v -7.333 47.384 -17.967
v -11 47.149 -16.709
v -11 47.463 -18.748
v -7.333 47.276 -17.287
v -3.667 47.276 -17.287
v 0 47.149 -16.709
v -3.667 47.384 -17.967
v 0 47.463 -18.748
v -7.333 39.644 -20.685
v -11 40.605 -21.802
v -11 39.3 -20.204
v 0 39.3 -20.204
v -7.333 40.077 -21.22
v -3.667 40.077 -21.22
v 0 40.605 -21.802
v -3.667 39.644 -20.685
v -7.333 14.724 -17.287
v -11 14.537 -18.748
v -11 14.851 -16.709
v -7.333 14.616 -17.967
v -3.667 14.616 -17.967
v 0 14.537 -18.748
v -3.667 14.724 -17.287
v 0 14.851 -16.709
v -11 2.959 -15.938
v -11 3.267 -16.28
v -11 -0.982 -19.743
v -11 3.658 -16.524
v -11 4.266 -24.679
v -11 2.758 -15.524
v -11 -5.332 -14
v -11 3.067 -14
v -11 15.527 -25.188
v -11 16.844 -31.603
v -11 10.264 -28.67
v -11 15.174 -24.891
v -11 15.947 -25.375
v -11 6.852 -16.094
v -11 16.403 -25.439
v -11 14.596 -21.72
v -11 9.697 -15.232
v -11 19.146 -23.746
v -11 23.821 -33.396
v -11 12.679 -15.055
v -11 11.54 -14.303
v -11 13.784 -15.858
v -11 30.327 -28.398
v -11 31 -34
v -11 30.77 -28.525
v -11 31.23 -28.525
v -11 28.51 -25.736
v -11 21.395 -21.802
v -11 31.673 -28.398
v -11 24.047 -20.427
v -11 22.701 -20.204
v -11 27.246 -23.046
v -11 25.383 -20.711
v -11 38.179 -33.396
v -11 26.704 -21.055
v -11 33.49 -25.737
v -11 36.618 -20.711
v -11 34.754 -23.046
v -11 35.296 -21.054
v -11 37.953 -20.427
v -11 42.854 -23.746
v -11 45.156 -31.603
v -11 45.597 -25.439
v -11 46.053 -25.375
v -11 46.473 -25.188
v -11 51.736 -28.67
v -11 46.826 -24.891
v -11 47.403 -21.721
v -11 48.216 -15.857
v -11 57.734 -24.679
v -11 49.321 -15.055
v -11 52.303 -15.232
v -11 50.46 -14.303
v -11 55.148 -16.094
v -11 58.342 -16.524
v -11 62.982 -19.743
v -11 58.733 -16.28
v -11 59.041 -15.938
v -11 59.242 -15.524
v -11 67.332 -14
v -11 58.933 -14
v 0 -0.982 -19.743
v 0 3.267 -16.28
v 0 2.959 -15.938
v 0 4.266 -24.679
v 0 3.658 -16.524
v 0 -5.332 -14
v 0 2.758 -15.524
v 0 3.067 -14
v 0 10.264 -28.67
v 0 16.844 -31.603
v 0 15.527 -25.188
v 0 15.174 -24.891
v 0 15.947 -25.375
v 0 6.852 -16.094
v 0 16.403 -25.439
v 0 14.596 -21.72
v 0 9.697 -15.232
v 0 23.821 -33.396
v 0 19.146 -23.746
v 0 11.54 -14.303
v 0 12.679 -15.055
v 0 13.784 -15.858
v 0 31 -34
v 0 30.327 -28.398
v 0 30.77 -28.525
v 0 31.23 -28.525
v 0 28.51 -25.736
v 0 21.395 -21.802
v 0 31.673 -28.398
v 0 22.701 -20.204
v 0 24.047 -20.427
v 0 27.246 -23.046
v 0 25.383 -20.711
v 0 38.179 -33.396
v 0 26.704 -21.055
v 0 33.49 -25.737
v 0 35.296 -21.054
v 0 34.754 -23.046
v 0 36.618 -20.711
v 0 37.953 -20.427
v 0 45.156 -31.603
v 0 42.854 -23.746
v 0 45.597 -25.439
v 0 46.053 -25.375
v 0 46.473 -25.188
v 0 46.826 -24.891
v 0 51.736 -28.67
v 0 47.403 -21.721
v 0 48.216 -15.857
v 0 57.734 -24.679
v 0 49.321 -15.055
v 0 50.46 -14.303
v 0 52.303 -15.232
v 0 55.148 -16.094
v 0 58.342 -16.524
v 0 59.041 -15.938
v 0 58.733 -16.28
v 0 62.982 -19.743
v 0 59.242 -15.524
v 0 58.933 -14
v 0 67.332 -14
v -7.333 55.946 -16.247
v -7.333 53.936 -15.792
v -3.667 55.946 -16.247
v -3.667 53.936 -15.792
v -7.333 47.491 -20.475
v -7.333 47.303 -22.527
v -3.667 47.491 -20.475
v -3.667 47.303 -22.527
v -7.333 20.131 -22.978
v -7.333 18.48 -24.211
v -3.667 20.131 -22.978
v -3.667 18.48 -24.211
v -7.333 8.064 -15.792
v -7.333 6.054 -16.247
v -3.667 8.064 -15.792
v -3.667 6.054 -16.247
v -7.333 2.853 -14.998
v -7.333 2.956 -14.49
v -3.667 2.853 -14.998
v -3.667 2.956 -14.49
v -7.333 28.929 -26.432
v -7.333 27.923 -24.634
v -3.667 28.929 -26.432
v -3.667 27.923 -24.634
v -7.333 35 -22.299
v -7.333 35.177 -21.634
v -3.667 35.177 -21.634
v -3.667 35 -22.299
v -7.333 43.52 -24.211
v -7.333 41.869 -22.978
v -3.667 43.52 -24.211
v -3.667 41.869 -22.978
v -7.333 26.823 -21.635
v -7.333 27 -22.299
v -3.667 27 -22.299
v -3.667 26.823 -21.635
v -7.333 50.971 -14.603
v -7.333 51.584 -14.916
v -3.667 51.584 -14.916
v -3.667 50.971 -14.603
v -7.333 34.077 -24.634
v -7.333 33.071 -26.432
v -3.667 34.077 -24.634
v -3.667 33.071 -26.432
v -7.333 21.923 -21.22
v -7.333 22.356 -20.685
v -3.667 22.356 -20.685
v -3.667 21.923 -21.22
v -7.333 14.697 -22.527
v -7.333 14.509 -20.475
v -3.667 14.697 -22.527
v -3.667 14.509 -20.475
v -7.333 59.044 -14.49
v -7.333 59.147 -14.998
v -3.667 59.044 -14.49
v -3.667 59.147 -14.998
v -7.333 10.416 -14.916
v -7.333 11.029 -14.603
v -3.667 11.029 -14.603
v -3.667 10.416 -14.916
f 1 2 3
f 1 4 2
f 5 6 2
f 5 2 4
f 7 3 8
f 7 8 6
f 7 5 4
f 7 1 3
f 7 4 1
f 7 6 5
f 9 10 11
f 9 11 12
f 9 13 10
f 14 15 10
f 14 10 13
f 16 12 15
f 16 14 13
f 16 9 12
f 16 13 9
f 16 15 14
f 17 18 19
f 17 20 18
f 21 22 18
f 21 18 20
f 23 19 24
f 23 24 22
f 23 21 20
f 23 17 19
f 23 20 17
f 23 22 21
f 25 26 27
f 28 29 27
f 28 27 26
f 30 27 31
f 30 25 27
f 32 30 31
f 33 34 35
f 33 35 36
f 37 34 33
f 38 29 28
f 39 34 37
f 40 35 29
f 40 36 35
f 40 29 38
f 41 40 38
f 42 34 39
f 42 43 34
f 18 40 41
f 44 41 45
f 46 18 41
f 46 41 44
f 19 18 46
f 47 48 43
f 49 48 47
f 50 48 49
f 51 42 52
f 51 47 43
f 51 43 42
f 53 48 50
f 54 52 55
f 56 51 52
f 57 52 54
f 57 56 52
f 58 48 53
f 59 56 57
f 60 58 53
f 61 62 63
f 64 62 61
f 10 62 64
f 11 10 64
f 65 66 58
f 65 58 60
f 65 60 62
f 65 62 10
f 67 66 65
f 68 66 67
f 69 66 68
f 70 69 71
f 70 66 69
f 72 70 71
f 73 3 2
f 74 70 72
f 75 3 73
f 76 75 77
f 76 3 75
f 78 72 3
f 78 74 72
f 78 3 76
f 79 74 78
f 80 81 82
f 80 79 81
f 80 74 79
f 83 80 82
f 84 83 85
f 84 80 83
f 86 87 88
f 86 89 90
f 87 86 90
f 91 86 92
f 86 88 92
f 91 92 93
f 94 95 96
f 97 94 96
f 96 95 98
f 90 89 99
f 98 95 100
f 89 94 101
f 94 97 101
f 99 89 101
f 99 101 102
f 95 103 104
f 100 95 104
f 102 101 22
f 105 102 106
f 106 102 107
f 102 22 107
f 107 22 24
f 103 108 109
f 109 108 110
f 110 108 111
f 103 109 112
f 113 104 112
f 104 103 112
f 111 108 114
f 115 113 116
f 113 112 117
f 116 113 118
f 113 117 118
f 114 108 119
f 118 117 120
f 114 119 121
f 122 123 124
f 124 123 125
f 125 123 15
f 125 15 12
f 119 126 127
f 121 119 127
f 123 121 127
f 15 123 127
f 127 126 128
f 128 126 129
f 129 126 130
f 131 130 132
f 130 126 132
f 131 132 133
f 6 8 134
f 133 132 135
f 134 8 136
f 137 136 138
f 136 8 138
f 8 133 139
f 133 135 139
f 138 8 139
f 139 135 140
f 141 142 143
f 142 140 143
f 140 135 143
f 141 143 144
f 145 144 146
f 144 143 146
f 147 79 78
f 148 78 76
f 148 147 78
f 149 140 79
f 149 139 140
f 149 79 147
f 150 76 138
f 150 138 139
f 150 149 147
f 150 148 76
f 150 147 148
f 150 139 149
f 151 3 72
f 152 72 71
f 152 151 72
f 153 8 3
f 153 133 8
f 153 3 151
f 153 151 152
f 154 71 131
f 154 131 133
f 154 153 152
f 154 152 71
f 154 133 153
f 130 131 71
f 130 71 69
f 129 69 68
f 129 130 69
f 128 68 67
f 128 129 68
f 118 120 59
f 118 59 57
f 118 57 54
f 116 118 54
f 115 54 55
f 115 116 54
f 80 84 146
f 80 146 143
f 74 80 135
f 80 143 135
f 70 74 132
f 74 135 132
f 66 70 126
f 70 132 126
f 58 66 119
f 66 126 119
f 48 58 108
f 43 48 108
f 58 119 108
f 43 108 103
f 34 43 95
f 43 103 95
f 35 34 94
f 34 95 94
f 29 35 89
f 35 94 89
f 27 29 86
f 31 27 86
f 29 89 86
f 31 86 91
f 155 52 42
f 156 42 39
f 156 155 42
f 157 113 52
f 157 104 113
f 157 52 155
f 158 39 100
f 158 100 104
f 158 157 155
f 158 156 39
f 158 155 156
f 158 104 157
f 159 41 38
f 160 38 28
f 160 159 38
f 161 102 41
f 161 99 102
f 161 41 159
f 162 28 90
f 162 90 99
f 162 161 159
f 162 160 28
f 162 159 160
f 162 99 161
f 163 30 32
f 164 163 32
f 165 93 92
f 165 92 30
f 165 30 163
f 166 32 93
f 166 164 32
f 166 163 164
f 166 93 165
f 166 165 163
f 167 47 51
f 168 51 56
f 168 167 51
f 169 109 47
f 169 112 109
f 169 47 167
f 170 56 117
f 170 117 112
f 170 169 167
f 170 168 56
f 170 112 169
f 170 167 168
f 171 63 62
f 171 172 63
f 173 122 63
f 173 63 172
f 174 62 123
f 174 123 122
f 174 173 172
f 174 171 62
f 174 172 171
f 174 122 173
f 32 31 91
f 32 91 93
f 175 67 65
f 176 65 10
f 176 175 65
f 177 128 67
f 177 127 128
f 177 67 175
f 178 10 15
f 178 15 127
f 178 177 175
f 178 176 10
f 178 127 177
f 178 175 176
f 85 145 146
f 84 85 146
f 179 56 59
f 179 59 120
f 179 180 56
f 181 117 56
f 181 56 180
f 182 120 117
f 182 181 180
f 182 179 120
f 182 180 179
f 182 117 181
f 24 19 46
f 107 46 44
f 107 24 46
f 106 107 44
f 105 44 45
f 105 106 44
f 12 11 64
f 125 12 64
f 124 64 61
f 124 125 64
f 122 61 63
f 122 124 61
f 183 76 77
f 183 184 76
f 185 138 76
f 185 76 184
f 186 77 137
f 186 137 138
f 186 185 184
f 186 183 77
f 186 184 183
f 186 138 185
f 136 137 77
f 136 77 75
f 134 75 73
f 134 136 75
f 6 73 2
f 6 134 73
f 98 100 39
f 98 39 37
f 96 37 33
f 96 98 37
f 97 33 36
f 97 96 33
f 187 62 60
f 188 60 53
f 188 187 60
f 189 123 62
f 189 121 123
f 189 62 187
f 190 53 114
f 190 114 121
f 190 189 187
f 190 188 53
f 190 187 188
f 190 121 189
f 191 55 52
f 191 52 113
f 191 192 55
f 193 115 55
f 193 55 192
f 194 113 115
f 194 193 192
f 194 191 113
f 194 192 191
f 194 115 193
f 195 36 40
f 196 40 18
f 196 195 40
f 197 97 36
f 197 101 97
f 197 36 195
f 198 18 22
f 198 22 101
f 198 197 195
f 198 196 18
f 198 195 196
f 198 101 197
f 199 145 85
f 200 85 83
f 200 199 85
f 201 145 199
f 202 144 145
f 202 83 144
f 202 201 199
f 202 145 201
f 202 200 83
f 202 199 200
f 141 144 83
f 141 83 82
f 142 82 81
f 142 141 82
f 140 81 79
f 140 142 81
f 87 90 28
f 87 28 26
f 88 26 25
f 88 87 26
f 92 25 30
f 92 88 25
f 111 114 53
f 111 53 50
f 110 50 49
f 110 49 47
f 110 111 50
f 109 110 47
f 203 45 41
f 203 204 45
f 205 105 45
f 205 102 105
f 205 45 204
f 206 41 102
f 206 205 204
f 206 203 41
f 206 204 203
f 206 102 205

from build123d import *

# Parameters (mm, degrees)
CYLINDER002_R           = 43
CYLINDER002_DEPTH       = 11
BOX003_W                = 66
BOX003_H                = 86
BOX003_DEPTH            = 11
POCKET_DEPTH            = 11
BODY002_PLACEMENT_ANGLE = 90


with BuildPart() as part:
    # Cylinder002 → Cylinder002 (join)
    with BuildSketch(Plane.XY):
        Circle(CYLINDER002_R)
    extrude(amount=CYLINDER002_DEPTH)

    # Box003 → Box003 (cut)
    with BuildSketch(Plane(origin=(-23, -43, 0), x_dir=(1, 0, 0), z_dir=(0, 0, 1))):
        with Locations((33, 43)):
            Rectangle(BOX003_W, BOX003_H)
    extrude(amount=BOX003_DEPTH, mode=Mode.SUBTRACT)

    # InvoluteGear001 → Pocket (cut)
    with BuildSketch(Plane.XY):
        with BuildLine():
            add(Edge.make_bspline(
                [(36.720789, -7.117559), (35.064159, -5.114865), (33.453467, -3.817874), (32.125762, -2.991102)],
                knots=[0, 0, 0, 0, 1, 1, 1, 1], degree=3))
            add(Edge.make_bspline(
                [(32.125762, -2.991102), (31.416273, -2.550129), (30.796057, -2.249632), (30.29133, -2.046354)],
                knots=[0, 0, 0, 0, 1, 1, 1, 1], degree=3))
            ThreePointArc((30.29133, -2.046354), (30.222112, -0.000102), (30.290969, 2.046161))
            add(Edge.make_bspline(
                [(30.290969, 2.046161), (30.796057, 2.249632), (31.416273, 2.550129), (32.125762, 2.991102)],
                knots=[0, 0, 0, 0, 1, 1, 1, 1], degree=3))
            add(Edge.make_bspline(
                [(32.125762, 2.991102), (33.453467, 3.817874), (35.064159, 5.114865), (36.720789, 7.117559)],
                knots=[0, 0, 0, 0, 1, 1, 1, 1], degree=3))
            ThreePointArc((36.720789, 7.117559), (36.721141, 7.80532), (36.441082, 8.433477))
            add(Edge.make_bspline(
                [(36.441082, 8.433477), (34.113106, 9.589217), (32.114132, 10.11895), (30.564934, 10.334217)],
                knots=[0, 0, 0, 0, 1, 1, 1, 1], degree=3))
            add(Edge.make_bspline(
                [(30.564934, 10.334217), (29.737424, 10.44849), (29.048606, 10.470744), (28.504834, 10.451156)],
                knots=[0, 0, 0, 0, 1, 1, 1, 1], degree=3))
            ThreePointArc((28.504834, 10.451156), (27.609315, 12.292347), (26.839929, 14.189708))
            add(Edge.make_bspline(
                [(26.839929, 14.189708), (27.21859, 14.581026), (27.662962, 15.107808), (28.131753, 15.799232)],
                knots=[0, 0, 0, 0, 1, 1, 1, 1], degree=3))
            add(Edge.make_bspline(
                [(28.131753, 15.799232), (29.008394, 17.094552), (29.9523, 18.93454), (30.651138, 21.437904)],
                knots=[0, 0, 0, 0, 1, 1, 1, 1], degree=3))
            ThreePointArc((30.651138, 21.437904), (30.371722, 22.066348), (29.860381, 22.526288))
            add(Edge.make_bspline(
                [(29.860381, 22.526288), (27.263587, 22.635236), (25.221972, 22.306115), (23.719152, 21.872656)],
                knots=[0, 0, 0, 0, 1, 1, 1, 1], degree=3))
            add(Edge.make_bspline(
                [(23.719152, 21.872656), (22.916705, 21.640471), (22.278386, 21.380633), (21.789593, 21.141567)],
                knots=[0, 0, 0, 0, 1, 1, 1, 1], degree=3))
            ThreePointArc((21.789593, 21.141567), (20.222617, 22.459338), (18.748021, 23.879726))
            add(Edge.make_bspline(
                [(18.748021, 23.879726), (18.934782, 24.391228), (19.126474, 25.05321), (19.273509, 25.875531)],
                knots=[0, 0, 0, 0, 1, 1, 1, 1], degree=3))
            add(Edge.make_bspline(
                [(19.273509, 25.875531), (19.547506, 27.415427), (19.661417, 29.480261), (19.281627, 32.051441)],
                knots=[0, 0, 0, 0, 1, 1, 1, 1], degree=3))
            ThreePointArc((19.281627, 32.051441), (18.770757, 32.511904), (18.116549, 32.724099))
            add(Edge.make_bspline(
                [(18.116549, 32.724099), (15.699946, 31.767417), (13.968703, 30.63635), (12.772113, 29.629114)],
                knots=[0, 0, 0, 0, 1, 1, 1, 1], degree=3))
            add(Edge.make_bspline(
                [(12.772113, 29.629114), (12.133479, 29.090618), (11.656032, 28.593616), (11.306734, 28.176408)],
                knots=[0, 0, 0, 0, 1, 1, 1, 1], degree=3))
            ThreePointArc((11.306734, 28.176408), (9.339244, 28.742905), (7.414409, 29.440722))
            add(Edge.make_bspline(
                [(7.414409, 29.440722), (7.376978, 29.983965), (7.282845, 30.666684), (7.0827, 31.477716)],
                knots=[0, 0, 0, 0, 1, 1, 1, 1], degree=3))
            add(Edge.make_bspline(
                [(7.0827, 31.477716), (6.706676, 32.995926), (5.970896, 34.928577), (4.578147, 37.122993)],
                knots=[0, 0, 0, 0, 1, 1, 1, 1], degree=3))
            ThreePointArc((4.578147, 37.122993), (3.924157, 37.335857), (3.2402, 37.263616))
            add(Edge.make_bspline(
                [(3.2402, 37.263616), (1.421642, 35.406723), (0.300119, 33.669282), (-0.38334, 32.262429)],
                knots=[0, 0, 0, 0, 1, 1, 1, 1], degree=3))
            add(Edge.make_bspline(
                [(-0.38334, 32.262429), (-0.747735, 31.510732), (-0.981757, 30.862503), (-1.131162, 30.339293)],
                knots=[0, 0, 0, 0, 1, 1, 1, 1], degree=3))
            ThreePointArc((-1.131162, 30.339293), (-3.158969, 30.056563), (-5.201221, 29.91115))
            add(Edge.make_bspline(
                [(-5.201221, 29.91115), (-5.456372, 30.392202), (-5.820054, 30.97761), (-6.332773, 31.637118)],
                knots=[0, 0, 0, 0, 1, 1, 1, 1], degree=3))
            add(Edge.make_bspline(
                [(-6.332773, 31.637118), (-7.293798, 32.871129), (-8.752048, 34.337425), (-10.916936, 35.775641)],
                knots=[0, 0, 0, 0, 1, 1, 1, 1], degree=3))
            ThreePointArc((-10.916936, 35.775641), (-11.600966, 35.704101), (-12.196408, 35.359916))
            add(Edge.make_bspline(
                [(-12.196408, 35.359916), (-13.102477, 32.923885), (-13.420358, 30.880489), (-13.472511, 29.317277)],
                knots=[0, 0, 0, 0, 1, 1, 1, 1], degree=3))
            add(Edge.make_bspline(
                [(-13.472511, 29.317277), (-13.49966, 28.482355), (-13.44979, 27.794983), (-13.37347, 27.256238)],
                knots=[0, 0, 0, 0, 1, 1, 1, 1], degree=3))
            ThreePointArc((-13.37347, 27.256238), (-15.110967, 26.173168), (-16.917512, 25.209668))
            add(Edge.make_bspline(
                [(-16.917512, 25.209668), (-17.346267, 25.545352), (-17.916613, 25.932226), (-18.653251, 26.326175)],
                knots=[0, 0, 0, 0, 1, 1, 1, 1], degree=3))
            add(Edge.make_bspline(
                [(-18.653251, 26.326175), (-20.033109, 27.062616), (-21.961682, 27.80902), (-24.524381, 28.242357)],
                knots=[0, 0, 0, 0, 1, 1, 1, 1], degree=3))
            ThreePointArc((-24.524381, 28.242357), (-25.120176, 27.898781), (-25.524146, 27.342164))
            add(Edge.make_bspline(
                [(-25.524146, 27.342164), (-25.361058, 24.748208), (-24.820334, 22.752179), (-24.232162, 21.302901)],
                knots=[0, 0, 0, 0, 1, 1, 1, 1], degree=3))
            add(Edge.make_bspline(
                [(-24.232162, 21.302901), (-23.91737, 20.52912), (-23.592233, 19.921458), (-23.303384, 19.460332)],
                knots=[0, 0, 0, 0, 1, 1, 1, 1], degree=3))
            ThreePointArc((-23.303384, 19.460332), (-24.450142, 17.764195), (-25.708612, 16.149206))
            add(Edge.make_bspline(
                [(-25.708612, 16.149206), (-26.236834, 16.281478), (-26.915227, 16.402924), (-27.748413, 16.463197)],
                knots=[0, 0, 0, 0, 1, 1, 1, 1], degree=3))
            add(Edge.make_bspline(
                [(-27.748413, 16.463197), (-29.308513, 16.57473), (-31.373943, 16.472183), (-33.891339, 15.825712)],
                knots=[0, 0, 0, 0, 1, 1, 1, 1], degree=3))
            ThreePointArc((-33.891339, 15.825712), (-34.295879, 15.269509), (-34.438528, 14.596704))
            add(Edge.make_bspline(
                [(-34.438528, 14.596704), (-33.234483, 12.293341), (-31.928648, 10.689811), (-30.801852, 9.60506)],
                knots=[0, 0, 0, 0, 1, 1, 1, 1], degree=3))
            add(Edge.make_bspline(
                [(-30.801852, 9.60506), (-30.19955, 9.026213), (-29.655365, 8.603332), (-29.203931, 8.299558)],
                knots=[0, 0, 0, 0, 1, 1, 1, 1], degree=3))
            ThreePointArc((-29.203931, 8.299558), (-29.561665, 6.283631), (-30.05446, 4.296399))
            add(Edge.make_bspline(
                [(-30.05446, 4.296399), (-30.590814, 4.202389), (-31.259953, 4.037408), (-32.045622, 3.753583)],
                knots=[0, 0, 0, 0, 1, 1, 1, 1], degree=3))
            add(Edge.make_bspline(
                [(-32.045622, 3.753583), (-33.51621, 3.220923), (-35.361363, 2.287156), (-37.398176, 0.672658)],
                knots=[0, 0, 0, 0, 1, 1, 1, 1], degree=3))
            ThreePointArc((-37.398176, 0.672658), (-37.541513, 0), (-37.398176, -0.672658))
            add(Edge.make_bspline(
                [(-37.398176, -0.672658), (-35.361363, -2.287156), (-33.51621, -3.220923), (-32.045622, -3.753583)],
                knots=[0, 0, 0, 0, 1, 1, 1, 1], degree=3))
            add(Edge.make_bspline(
                [(-32.045622, -3.753583), (-31.259953, -4.037408), (-30.590814, -4.202389), (-30.054852, -4.296285)],
                knots=[0, 0, 0, 0, 1, 1, 1, 1], degree=3))
            ThreePointArc((-30.054852, -4.296285), (-29.561708, -6.28343), (-29.203618, -8.299294))
            add(Edge.make_bspline(
                [(-29.203618, -8.299294), (-29.655365, -8.603332), (-30.19955, -9.026213), (-30.801852, -9.60506)],
                knots=[0, 0, 0, 0, 1, 1, 1, 1], degree=3))
            add(Edge.make_bspline(
                [(-30.801852, -9.60506), (-31.928648, -10.689811), (-33.234483, -12.293341), (-34.438528, -14.596704)],
                knots=[0, 0, 0, 0, 1, 1, 1, 1], degree=3))
            ThreePointArc((-34.438528, -14.596704), (-34.295879, -15.269509), (-33.891339, -15.825712))
            add(Edge.make_bspline(
                [(-33.891339, -15.825712), (-31.373943, -16.472183), (-29.308513, -16.57473), (-27.748413, -16.463197)],
                knots=[0, 0, 0, 0, 1, 1, 1, 1], degree=3))
            add(Edge.make_bspline(
                [(-27.748413, -16.463197), (-26.915227, -16.402924), (-26.236834, -16.281478), (-25.709017, -16.149262)],
                knots=[0, 0, 0, 0, 1, 1, 1, 1], degree=3))
            ThreePointArc((-25.709017, -16.149262), (-24.450263, -17.764029), (-23.303206, -19.459964))
            add(Edge.make_bspline(
                [(-23.303206, -19.459964), (-23.592233, -19.921458), (-23.91737, -20.52912), (-24.232162, -21.302901)],
                knots=[0, 0, 0, 0, 1, 1, 1, 1], degree=3))
            add(Edge.make_bspline(
                [(-24.232162, -21.302901), (-24.820334, -22.752179), (-25.361058, -24.748208), (-25.524146, -27.342164)],
                knots=[0, 0, 0, 0, 1, 1, 1, 1], degree=3))
            ThreePointArc((-25.524146, -27.342164), (-25.120176, -27.898781), (-24.524381, -28.242357))
            add(Edge.make_bspline(
                [(-24.524381, -28.242357), (-21.961682, -27.80902), (-20.033109, -27.062616), (-18.653251, -26.326175)],
                knots=[0, 0, 0, 0, 1, 1, 1, 1], degree=3))
            add(Edge.make_bspline(
                [(-18.653251, -26.326175), (-17.916613, -25.932226), (-17.346267, -25.545352), (-16.917859, -25.209884)],
                knots=[0, 0, 0, 0, 1, 1, 1, 1], degree=3))
            ThreePointArc((-16.917859, -25.209884), (-15.111145, -26.173066), (-13.373457, -27.25583))
            add(Edge.make_bspline(
                [(-13.373457, -27.25583), (-13.44979, -27.794983), (-13.49966, -28.482355), (-13.472511, -29.317277)],
                knots=[0, 0, 0, 0, 1, 1, 1, 1], degree=3))
            add(Edge.make_bspline(
                [(-13.472511, -29.317277), (-13.420358, -30.880489), (-13.102477, -32.923885), (-12.196408, -35.359916)],
                knots=[0, 0, 0, 0, 1, 1, 1, 1], degree=3))
            ThreePointArc((-12.196408, -35.359916), (-11.600966, -35.704101), (-10.916936, -35.775641))
            add(Edge.make_bspline(
                [(-10.916936, -35.775641), (-8.752048, -34.337425), (-7.293798, -32.871129), (-6.332773, -31.637118)],
                knots=[0, 0, 0, 0, 1, 1, 1, 1], degree=3))
            add(Edge.make_bspline(
                [(-6.332773, -31.637118), (-5.820054, -30.97761), (-5.456372, -30.392202), (-5.20145, -29.911488)],
                knots=[0, 0, 0, 0, 1, 1, 1, 1], degree=3))
            ThreePointArc((-5.20145, -29.911488), (-3.159173, -30.056542), (-1.131316, -30.338914))
            add(Edge.make_bspline(
                [(-1.131316, -30.338914), (-0.981757, -30.862503), (-0.747735, -31.510732), (-0.38334, -32.262429)],
                knots=[0, 0, 0, 0, 1, 1, 1, 1], degree=3))
            add(Edge.make_bspline(
                [(-0.38334, -32.262429), (0.300119, -33.669282), (1.421642, -35.406723), (3.2402, -37.263616)],
                knots=[0, 0, 0, 0, 1, 1, 1, 1], degree=3))
            ThreePointArc((3.2402, -37.263616), (3.924157, -37.335857), (4.578147, -37.122993))
            add(Edge.make_bspline(
                [(4.578147, -37.122993), (5.970896, -34.928577), (6.706676, -32.995926), (7.0827, -31.477716)],
                knots=[0, 0, 0, 0, 1, 1, 1, 1], degree=3))
            add(Edge.make_bspline(
                [(7.0827, -31.477716), (7.282845, -30.666684), (7.376978, -29.983965), (7.414337, -29.441125)],
                knots=[0, 0, 0, 0, 1, 1, 1, 1], degree=3))
            ThreePointArc((7.414337, -29.441125), (9.339049, -28.742969), (11.306439, -28.176125))
            add(Edge.make_bspline(
                [(11.306439, -28.176125), (11.656032, -28.593616), (12.133479, -29.090618), (12.772113, -29.629114)],
                knots=[0, 0, 0, 0, 1, 1, 1, 1], degree=3))
            add(Edge.make_bspline(
                [(12.772113, -29.629114), (13.968703, -30.63635), (15.699946, -31.767417), (18.116549, -32.724099)],
                knots=[0, 0, 0, 0, 1, 1, 1, 1], degree=3))
            ThreePointArc((18.116549, -32.724099), (18.770757, -32.511904), (19.281627, -32.051441))
            add(Edge.make_bspline(
                [(19.281627, -32.051441), (19.661417, -29.480261), (19.547506, -27.415427), (19.273509, -25.875531)],
                knots=[0, 0, 0, 0, 1, 1, 1, 1], degree=3))
            add(Edge.make_bspline(
                [(19.273509, -25.875531), (19.126474, -25.05321), (18.934782, -24.391228), (18.748118, -23.880123)],
                knots=[0, 0, 0, 0, 1, 1, 1, 1], degree=3))
            ThreePointArc((18.748118, -23.880123), (20.222464, -22.459475), (21.789209, -21.141428))
            add(Edge.make_bspline(
                [(21.789209, -21.141428), (22.278386, -21.380633), (22.916705, -21.640471), (23.719152, -21.872656)],
                knots=[0, 0, 0, 0, 1, 1, 1, 1], degree=3))
            add(Edge.make_bspline(
                [(23.719152, -21.872656), (25.221972, -22.306115), (27.263587, -22.635236), (29.860381, -22.526288)],
                knots=[0, 0, 0, 0, 1, 1, 1, 1], degree=3))
            ThreePointArc((29.860381, -22.526288), (30.371722, -22.066348), (30.651138, -21.437904))
            add(Edge.make_bspline(
                [(30.651138, -21.437904), (29.9523, -18.93454), (29.008394, -17.094552), (28.131753, -15.799232)],
                knots=[0, 0, 0, 0, 1, 1, 1, 1], degree=3))
            add(Edge.make_bspline(
                [(28.131753, -15.799232), (27.662962, -15.107808), (27.21859, -14.581026), (26.840179, -14.190031)],
                knots=[0, 0, 0, 0, 1, 1, 1, 1], degree=3))
            ThreePointArc((26.840179, -14.190031), (27.609232, -12.292534), (28.504426, -10.451186))
            add(Edge.make_bspline(
                [(28.504426, -10.451186), (29.048606, -10.470744), (29.737424, -10.44849), (30.564934, -10.334217)],
                knots=[0, 0, 0, 0, 1, 1, 1, 1], degree=3))
            add(Edge.make_bspline(
                [(30.564934, -10.334217), (32.114132, -10.11895), (34.113106, -9.589217), (36.441082, -8.433477)],
                knots=[0, 0, 0, 0, 1, 1, 1, 1], degree=3))
            ThreePointArc((36.441082, -8.433477), (36.721141, -7.80532), (36.720789, -7.117559))
        make_face()
    extrude(amount=POCKET_DEPTH, mode=Mode.SUBTRACT)


with BuildPart() as part_1:
    # Body002 placement: moved
    add(part.part.moved(Location((0, 31, 9))).rotate(Axis((0, 31, 9), (0, -1, 0)), BODY002_PLACEMENT_ANGLE))


solid = part_1.part
